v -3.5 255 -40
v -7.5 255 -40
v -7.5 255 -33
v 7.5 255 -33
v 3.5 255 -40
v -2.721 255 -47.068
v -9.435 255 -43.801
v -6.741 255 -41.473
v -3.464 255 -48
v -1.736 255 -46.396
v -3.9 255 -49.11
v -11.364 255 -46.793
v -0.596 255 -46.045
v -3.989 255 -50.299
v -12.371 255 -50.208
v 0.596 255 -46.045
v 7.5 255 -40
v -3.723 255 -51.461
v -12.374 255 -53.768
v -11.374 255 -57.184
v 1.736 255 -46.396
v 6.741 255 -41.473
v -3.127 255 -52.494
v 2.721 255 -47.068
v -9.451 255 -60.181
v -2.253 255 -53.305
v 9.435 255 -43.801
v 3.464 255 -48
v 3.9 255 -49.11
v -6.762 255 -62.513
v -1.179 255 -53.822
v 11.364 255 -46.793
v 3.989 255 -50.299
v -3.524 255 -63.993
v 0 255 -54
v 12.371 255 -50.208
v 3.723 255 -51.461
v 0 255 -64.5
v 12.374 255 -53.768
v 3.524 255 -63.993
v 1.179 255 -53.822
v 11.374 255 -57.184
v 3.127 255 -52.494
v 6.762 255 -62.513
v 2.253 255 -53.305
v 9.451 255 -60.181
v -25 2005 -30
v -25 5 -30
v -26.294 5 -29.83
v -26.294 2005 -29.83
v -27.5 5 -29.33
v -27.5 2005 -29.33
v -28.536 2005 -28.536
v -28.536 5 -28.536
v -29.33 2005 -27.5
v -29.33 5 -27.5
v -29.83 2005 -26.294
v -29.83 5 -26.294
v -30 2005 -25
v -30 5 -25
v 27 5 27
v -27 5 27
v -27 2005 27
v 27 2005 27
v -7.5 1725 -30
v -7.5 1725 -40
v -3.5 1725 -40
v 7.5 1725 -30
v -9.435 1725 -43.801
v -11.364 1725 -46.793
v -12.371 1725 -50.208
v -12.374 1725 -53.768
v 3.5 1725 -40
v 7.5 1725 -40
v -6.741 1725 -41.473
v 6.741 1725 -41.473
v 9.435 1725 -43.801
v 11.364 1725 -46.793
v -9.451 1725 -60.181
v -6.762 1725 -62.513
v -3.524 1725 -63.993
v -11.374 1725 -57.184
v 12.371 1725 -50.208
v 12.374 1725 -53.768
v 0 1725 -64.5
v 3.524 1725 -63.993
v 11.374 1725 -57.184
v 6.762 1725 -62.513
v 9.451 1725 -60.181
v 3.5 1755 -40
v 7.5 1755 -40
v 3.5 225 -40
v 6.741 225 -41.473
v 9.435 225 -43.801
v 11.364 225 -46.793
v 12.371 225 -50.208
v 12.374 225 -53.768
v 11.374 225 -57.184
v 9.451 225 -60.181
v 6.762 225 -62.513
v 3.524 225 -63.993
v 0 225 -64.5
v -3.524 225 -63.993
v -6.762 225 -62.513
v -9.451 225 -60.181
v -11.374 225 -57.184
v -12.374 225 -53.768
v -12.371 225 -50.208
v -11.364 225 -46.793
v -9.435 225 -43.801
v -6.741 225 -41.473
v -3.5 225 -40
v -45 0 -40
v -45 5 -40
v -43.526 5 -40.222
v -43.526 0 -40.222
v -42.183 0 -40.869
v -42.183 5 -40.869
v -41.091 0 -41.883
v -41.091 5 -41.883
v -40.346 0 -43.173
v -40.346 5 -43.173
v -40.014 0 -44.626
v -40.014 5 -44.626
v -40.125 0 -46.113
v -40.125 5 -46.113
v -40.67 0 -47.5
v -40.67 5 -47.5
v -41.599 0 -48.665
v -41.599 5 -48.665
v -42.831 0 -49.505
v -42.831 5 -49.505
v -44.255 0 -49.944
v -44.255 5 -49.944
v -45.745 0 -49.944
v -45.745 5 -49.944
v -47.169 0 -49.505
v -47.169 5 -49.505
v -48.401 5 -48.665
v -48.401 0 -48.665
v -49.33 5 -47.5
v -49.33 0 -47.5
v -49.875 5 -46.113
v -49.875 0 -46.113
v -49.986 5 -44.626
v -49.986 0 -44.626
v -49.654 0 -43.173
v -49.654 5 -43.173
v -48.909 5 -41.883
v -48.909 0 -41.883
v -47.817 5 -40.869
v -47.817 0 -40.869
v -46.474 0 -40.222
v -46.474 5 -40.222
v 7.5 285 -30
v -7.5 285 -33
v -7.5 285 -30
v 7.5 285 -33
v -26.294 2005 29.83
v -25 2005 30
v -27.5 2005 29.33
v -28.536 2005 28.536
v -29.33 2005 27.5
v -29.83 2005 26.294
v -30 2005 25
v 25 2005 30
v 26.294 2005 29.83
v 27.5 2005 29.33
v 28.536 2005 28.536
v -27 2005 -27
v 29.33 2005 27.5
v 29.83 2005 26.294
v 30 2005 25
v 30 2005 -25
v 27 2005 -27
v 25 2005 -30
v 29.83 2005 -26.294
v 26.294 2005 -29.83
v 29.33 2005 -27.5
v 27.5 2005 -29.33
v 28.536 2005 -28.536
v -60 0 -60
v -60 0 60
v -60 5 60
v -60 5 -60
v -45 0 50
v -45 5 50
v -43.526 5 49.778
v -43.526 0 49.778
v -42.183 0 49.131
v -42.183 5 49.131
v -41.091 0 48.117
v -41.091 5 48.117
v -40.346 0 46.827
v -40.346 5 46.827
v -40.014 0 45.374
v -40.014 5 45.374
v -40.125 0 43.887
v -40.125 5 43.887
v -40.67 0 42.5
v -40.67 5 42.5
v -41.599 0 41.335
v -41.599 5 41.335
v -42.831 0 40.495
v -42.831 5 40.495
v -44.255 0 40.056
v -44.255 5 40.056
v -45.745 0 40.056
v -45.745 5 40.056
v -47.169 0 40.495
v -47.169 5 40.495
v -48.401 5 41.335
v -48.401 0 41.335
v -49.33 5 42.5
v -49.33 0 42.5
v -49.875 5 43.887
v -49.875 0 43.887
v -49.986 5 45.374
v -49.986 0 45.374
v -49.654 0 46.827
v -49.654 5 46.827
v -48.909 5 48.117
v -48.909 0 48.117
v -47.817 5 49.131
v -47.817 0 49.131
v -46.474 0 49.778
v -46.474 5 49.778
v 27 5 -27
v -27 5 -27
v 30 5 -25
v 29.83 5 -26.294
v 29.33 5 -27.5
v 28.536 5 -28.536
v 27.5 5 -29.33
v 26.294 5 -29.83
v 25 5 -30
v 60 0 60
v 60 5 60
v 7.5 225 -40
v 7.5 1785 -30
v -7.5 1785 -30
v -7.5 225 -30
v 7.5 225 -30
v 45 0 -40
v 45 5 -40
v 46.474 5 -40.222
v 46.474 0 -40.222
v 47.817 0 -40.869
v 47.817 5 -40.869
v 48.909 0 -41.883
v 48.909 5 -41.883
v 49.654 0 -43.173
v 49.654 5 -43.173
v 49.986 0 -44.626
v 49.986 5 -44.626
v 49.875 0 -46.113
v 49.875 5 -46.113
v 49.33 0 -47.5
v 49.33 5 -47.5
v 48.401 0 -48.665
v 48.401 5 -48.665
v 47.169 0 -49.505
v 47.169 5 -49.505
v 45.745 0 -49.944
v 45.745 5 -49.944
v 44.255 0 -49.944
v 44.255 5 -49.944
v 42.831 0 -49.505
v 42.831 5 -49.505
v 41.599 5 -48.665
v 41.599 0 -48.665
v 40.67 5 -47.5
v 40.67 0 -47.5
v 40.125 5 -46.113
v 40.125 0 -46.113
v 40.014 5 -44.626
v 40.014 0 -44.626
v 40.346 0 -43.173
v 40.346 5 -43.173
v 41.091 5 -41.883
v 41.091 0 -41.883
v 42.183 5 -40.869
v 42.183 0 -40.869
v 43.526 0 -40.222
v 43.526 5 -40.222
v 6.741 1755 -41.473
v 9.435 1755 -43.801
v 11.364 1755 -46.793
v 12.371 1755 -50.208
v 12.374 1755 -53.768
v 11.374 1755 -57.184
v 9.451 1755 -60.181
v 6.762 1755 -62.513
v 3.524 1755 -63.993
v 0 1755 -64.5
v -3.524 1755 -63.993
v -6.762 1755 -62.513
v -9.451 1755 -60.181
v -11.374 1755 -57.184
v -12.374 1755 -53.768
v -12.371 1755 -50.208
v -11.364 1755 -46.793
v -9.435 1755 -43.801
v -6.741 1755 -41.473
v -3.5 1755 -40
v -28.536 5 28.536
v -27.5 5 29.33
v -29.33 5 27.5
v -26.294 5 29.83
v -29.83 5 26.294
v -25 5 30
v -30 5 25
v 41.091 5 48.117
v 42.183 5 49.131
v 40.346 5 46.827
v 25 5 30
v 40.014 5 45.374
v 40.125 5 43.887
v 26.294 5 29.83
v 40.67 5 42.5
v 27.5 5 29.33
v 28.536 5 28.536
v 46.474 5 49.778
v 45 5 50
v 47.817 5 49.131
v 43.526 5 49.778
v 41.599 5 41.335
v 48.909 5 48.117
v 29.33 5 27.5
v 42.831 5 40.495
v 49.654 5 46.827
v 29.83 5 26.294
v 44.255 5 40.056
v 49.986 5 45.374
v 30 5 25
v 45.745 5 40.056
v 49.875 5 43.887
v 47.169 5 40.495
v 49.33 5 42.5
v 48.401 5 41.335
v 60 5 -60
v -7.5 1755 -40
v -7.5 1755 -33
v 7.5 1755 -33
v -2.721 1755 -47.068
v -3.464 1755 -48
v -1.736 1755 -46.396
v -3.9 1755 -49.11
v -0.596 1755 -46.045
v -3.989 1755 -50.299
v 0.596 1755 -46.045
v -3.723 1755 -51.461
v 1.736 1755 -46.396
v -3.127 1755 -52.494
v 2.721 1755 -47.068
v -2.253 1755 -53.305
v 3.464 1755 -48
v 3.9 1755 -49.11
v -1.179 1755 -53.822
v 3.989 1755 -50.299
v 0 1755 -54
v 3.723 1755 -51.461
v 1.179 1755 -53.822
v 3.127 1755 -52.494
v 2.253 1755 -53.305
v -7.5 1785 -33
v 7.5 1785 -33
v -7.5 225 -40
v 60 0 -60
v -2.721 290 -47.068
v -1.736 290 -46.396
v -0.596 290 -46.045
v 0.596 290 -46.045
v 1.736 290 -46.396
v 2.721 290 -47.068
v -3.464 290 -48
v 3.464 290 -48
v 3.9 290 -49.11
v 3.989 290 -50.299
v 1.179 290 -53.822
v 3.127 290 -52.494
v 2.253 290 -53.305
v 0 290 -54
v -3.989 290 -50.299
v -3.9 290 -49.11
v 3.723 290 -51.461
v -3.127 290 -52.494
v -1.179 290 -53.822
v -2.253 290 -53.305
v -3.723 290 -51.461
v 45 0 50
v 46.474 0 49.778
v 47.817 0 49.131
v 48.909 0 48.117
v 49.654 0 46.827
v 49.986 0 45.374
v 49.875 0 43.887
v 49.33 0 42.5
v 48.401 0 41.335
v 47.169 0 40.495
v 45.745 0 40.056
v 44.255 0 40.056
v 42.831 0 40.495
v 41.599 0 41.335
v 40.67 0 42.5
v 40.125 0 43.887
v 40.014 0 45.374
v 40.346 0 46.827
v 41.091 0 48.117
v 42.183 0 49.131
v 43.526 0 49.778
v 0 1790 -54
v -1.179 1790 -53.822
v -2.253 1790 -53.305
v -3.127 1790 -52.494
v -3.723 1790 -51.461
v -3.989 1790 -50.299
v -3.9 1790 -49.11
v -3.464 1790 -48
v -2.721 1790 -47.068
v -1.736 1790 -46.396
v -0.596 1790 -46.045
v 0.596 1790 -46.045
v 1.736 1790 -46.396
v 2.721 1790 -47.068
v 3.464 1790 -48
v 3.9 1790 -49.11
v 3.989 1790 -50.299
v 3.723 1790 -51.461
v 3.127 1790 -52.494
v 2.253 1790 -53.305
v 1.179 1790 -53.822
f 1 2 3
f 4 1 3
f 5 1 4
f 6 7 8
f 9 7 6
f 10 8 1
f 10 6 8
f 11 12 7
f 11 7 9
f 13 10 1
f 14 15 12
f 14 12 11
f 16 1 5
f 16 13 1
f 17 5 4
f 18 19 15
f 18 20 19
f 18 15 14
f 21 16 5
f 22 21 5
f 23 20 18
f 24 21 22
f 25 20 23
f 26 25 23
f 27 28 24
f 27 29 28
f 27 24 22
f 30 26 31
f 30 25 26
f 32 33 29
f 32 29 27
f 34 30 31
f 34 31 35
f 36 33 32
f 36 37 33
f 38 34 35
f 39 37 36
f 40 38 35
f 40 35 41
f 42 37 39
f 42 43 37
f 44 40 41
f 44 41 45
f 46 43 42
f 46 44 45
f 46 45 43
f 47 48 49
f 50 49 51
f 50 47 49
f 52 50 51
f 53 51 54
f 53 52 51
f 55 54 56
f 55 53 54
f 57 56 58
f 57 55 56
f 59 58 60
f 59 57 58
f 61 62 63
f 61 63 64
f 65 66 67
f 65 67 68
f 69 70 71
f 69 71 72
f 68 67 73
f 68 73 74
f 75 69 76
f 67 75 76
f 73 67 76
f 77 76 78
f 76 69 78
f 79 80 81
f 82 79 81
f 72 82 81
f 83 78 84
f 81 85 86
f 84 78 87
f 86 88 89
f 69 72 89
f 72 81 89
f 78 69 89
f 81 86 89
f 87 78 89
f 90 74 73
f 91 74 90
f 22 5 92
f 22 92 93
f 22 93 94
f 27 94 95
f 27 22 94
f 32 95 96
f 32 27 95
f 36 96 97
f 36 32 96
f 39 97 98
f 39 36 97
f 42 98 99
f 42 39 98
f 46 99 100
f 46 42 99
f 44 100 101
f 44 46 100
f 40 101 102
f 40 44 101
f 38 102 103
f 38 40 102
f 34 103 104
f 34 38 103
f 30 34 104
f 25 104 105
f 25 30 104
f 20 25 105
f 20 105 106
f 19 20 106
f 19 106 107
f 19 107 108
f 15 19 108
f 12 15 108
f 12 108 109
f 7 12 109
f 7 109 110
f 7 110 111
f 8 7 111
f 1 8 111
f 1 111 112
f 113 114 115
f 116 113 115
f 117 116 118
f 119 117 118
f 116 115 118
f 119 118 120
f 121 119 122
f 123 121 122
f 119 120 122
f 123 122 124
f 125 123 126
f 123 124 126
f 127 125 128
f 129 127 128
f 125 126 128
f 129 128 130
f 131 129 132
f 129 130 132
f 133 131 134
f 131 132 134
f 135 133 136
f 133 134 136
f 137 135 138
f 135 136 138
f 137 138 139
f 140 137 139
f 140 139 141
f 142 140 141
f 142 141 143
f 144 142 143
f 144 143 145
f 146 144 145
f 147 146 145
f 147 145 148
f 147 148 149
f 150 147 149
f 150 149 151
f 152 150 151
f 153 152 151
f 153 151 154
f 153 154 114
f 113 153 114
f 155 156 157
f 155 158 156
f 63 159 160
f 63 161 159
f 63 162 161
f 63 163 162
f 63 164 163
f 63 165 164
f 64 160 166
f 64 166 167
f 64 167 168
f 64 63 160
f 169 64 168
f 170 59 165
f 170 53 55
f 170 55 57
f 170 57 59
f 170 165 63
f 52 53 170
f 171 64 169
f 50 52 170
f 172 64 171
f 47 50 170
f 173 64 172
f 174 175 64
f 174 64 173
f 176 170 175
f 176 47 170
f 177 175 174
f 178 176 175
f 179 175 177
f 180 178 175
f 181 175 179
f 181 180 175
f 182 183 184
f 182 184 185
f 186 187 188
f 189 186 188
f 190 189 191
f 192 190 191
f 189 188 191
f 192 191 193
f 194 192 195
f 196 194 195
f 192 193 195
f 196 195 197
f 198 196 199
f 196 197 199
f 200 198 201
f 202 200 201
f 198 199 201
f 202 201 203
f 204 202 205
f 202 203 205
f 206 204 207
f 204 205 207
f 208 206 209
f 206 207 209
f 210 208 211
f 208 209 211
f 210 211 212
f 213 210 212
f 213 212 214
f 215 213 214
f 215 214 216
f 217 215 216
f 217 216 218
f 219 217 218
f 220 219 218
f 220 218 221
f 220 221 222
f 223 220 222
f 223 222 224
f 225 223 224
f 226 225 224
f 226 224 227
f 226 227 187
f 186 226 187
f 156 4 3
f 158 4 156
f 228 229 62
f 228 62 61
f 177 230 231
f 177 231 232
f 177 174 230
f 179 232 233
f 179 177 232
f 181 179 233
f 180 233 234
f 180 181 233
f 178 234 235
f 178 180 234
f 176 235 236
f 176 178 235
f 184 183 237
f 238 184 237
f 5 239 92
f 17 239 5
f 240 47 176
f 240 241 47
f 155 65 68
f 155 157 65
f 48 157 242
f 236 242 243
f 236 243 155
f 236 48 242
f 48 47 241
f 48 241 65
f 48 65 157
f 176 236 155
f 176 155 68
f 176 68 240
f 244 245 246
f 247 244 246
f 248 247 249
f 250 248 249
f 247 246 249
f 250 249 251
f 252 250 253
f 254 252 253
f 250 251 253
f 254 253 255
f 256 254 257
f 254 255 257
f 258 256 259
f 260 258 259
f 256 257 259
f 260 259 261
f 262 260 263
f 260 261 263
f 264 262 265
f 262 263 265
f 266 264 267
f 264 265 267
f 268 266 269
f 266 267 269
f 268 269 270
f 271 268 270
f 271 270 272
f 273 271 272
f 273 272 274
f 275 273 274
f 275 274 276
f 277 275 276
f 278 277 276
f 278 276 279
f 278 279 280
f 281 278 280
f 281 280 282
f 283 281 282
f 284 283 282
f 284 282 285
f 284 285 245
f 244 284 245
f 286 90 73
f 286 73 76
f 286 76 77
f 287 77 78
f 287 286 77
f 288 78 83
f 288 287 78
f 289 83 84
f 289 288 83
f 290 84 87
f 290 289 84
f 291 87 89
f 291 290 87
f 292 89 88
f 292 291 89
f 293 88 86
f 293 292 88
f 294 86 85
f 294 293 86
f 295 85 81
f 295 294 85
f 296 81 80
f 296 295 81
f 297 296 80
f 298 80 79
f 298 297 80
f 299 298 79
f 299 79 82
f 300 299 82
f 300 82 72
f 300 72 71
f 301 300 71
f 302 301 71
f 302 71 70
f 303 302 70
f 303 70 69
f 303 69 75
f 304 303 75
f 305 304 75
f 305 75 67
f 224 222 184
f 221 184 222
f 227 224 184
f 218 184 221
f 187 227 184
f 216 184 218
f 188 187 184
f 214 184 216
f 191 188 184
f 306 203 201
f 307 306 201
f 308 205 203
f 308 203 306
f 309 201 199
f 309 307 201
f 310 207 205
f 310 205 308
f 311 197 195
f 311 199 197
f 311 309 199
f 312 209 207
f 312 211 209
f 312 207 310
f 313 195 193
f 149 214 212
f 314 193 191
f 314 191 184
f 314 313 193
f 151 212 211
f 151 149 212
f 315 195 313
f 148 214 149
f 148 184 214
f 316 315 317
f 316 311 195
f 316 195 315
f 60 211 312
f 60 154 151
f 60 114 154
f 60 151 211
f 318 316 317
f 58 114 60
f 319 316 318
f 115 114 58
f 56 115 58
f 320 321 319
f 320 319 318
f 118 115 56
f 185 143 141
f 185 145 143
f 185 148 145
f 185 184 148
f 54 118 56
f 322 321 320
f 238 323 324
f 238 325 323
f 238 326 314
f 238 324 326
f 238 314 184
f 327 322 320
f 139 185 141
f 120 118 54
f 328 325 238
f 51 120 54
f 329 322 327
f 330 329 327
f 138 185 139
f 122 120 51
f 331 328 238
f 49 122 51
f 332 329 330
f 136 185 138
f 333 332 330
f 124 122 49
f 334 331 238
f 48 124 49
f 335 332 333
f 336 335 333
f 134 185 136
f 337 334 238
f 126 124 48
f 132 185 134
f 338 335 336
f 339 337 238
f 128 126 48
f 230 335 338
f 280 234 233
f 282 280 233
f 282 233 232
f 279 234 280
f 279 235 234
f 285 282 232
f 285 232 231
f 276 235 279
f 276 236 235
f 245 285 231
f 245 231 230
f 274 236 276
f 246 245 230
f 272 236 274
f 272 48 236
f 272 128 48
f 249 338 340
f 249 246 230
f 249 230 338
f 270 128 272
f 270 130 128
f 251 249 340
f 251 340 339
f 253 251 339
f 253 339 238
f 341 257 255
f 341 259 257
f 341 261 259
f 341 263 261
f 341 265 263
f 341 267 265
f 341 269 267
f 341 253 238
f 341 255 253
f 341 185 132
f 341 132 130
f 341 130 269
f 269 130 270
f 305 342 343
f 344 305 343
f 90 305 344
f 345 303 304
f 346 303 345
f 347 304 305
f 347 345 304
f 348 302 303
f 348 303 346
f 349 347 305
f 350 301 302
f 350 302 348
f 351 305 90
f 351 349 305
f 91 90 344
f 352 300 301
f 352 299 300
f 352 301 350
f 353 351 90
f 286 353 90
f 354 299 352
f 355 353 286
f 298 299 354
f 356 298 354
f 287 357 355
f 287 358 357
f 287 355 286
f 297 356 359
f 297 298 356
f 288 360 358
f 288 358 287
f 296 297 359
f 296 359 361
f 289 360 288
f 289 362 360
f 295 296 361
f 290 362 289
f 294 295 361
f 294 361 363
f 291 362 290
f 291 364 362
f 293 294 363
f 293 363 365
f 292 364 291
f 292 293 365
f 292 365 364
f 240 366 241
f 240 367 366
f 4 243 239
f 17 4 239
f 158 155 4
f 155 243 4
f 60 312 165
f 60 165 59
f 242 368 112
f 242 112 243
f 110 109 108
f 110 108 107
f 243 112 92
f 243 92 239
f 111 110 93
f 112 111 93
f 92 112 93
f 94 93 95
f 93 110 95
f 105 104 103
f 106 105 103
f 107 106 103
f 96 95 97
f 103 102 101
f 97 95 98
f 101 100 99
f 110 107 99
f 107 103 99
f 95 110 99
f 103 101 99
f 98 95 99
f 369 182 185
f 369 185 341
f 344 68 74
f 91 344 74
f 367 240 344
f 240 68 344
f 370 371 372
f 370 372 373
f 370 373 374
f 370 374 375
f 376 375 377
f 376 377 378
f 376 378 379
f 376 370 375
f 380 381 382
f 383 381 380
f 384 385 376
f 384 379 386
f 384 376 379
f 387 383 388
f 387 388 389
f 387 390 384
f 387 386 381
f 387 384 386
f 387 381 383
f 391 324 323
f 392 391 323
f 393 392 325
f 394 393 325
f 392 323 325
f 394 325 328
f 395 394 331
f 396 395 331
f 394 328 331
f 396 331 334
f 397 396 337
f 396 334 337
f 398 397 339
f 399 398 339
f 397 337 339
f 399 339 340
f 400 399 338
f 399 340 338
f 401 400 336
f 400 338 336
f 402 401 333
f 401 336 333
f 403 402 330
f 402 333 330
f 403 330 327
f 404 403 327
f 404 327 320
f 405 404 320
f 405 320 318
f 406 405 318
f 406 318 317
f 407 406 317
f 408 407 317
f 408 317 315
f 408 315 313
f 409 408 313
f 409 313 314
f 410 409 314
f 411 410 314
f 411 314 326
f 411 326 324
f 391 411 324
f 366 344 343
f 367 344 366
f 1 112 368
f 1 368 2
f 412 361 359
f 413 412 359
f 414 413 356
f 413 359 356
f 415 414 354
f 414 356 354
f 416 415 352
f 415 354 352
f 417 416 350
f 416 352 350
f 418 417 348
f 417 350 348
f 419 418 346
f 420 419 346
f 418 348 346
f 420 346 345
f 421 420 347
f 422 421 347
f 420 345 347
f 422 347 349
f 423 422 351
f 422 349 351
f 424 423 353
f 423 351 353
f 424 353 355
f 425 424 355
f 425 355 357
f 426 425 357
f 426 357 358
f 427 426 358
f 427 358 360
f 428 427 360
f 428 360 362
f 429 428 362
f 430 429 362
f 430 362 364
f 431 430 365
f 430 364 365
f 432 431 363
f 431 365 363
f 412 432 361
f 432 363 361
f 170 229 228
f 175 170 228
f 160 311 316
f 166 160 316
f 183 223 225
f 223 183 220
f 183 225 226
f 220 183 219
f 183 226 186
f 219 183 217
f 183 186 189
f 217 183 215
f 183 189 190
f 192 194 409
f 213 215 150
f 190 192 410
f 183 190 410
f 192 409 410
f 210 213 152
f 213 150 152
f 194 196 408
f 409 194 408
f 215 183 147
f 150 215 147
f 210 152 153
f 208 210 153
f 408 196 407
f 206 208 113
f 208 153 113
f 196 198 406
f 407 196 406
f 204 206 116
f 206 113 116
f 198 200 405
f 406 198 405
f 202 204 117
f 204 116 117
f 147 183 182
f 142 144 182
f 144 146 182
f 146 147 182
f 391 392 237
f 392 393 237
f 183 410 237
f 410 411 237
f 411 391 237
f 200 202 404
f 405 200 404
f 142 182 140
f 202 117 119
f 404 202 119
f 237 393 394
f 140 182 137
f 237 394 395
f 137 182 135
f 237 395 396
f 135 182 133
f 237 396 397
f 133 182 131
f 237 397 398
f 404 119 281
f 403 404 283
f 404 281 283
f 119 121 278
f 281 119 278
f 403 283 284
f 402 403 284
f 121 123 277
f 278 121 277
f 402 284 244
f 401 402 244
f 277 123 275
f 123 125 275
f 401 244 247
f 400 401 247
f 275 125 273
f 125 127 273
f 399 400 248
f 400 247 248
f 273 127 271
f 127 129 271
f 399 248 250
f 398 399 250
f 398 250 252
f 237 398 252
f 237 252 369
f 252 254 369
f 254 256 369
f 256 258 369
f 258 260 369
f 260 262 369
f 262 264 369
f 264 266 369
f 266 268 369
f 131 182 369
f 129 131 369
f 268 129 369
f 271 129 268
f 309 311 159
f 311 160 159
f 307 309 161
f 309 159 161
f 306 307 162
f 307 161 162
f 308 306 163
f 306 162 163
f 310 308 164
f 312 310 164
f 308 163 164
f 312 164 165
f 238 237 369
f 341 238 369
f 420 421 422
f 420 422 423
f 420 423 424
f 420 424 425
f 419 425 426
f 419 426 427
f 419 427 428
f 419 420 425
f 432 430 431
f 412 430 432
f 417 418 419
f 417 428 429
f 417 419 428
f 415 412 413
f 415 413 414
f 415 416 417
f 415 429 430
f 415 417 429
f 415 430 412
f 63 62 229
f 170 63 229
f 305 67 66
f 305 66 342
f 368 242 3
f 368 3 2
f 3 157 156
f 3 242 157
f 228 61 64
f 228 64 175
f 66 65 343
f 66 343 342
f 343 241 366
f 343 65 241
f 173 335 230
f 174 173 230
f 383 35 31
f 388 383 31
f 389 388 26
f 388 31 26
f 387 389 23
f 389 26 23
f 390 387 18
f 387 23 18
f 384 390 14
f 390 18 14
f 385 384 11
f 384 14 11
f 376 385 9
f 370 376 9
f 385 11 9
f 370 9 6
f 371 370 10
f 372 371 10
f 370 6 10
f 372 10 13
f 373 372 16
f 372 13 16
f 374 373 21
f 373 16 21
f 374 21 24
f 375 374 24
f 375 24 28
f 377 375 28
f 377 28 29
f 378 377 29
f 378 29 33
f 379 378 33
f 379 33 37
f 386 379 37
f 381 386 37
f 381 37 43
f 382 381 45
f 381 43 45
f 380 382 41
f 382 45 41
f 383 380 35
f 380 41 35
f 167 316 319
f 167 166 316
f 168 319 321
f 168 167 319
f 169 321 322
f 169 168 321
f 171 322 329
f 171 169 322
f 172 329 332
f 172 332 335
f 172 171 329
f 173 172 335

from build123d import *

# Parameters (mm, degrees)
SKETCH_1_W             = 120
SKETCH_1_H             = 120
EXTRUDE_1_DEPTH        = 5
SKETCH_2_W             = 60
SKETCH_2_H             = 60
SKETCH_2_W_2           = 54
SKETCH_2_H_2           = 54
EXTRUDE_2_DEPTH        = 2000
FILLET_1_R             = 5
SKETCH_3_R             = 5
CUT_EXTRUDE_1_DEPTH    = 2000
EXTRUDE_5_DEPTH        = 7.5
PATTERN_LINEAR_1_COUNT = 2
PATTERN_LINEAR_1_PITCH = 1500
SKETCH_7_R             = 12.5
EXTRUDE_6_DEPTH        = 30
SKETCH_8_R             = 4
EXTRUDE_7_DEPTH        = 35
PATTERN_LINEAR_2_COUNT = 2
PATTERN_LINEAR_2_PITCH = 1500


with BuildPart() as part:
    # 草图1 → 凸台-拉伸1 (new body)
    with BuildSketch(Plane(origin=(0, 0, 0), x_dir=(1, 0, 0), z_dir=(0, 1, 0))):
        Rectangle(SKETCH_1_W, SKETCH_1_H)
    extrude(amount=EXTRUDE_1_DEPTH)

    # 草图2 → 凸台-拉伸2 (add)
    with BuildSketch(Plane(origin=(0, 5, 0), x_dir=(1, 0, 0), z_dir=(0, 1, 0))):
        Rectangle(SKETCH_2_W, SKETCH_2_H)
        Rectangle(SKETCH_2_W_2, SKETCH_2_H_2, mode=Mode.SUBTRACT)
    extrude(amount=EXTRUDE_2_DEPTH)

    # 圆角1
    fillet_1_edges = [part.edges().sort_by_distance(p)[0] for p in [
        (-30, 1005, 30),
        (30, 1005, 30),
        (-30, 1005, -30),
        (30, 1005, -30),
    ]]
    fillet(fillet_1_edges, radius=FILLET_1_R)

    # 草图3 → 切除-拉伸1 (cut)
    with BuildSketch(Plane(origin=(0, 5, 0), x_dir=(1, 0, 0), z_dir=(0, 1, 0))):
        with Locations((-45, 45)):
            Circle(SKETCH_3_R)
        with Locations((45, 45)):
            Circle(SKETCH_3_R)
        with Locations((-45, -45)):
            Circle(SKETCH_3_R)
        with Locations((45, -45)):
            Circle(SKETCH_3_R)
    extrude(amount=-CUT_EXTRUDE_1_DEPTH, mode=Mode.SUBTRACT)

    # 草图6 → 凸台-拉伸5 (add, symmetric)
    with BuildSketch(Plane(origin=(0, 0, 0), x_dir=(0, 0, -1), z_dir=(1, 0, 0))):
        Polygon((30, 1785), (30, 1725), (40, 1725), (40, 1755), (33, 1755), (33, 1785), align=None)
    extrude_5 = extrude(amount=EXTRUDE_5_DEPTH, both=True)

    # 阵列(线性)1: 凸台-拉伸5 ×2
    with Locations(*[(0, -i * PATTERN_LINEAR_1_PITCH, 0) for i in range(1, PATTERN_LINEAR_1_COUNT)]):
        add(extrude_5)

    # 草图7 → 凸台-拉伸6 (add)
    with BuildSketch(Plane(origin=(0, 1755, 0), x_dir=(1, 0, 0), z_dir=(0, 1, 0))):
        with Locations((0, 52)):
            Circle(SKETCH_7_R)
    extrude_6 = extrude(amount=-EXTRUDE_6_DEPTH)

    # 草图8 → 凸台-拉伸7 (add)
    with BuildSketch(Plane(origin=(0, 1755, 0), x_dir=(1, 0, 0), z_dir=(0, 1, 0))):
        with Locations((0, 50)):
            Circle(SKETCH_8_R)
    extrude_7 = extrude(amount=EXTRUDE_7_DEPTH)

    # 阵列(线性)2: 凸台-拉伸6, 凸台-拉伸7 ×2
    with Locations(*[(0, -i * PATTERN_LINEAR_2_PITCH, 0) for i in range(1, PATTERN_LINEAR_2_COUNT)]):
        add(extrude_6)
        add(extrude_7)


solid = part.part
